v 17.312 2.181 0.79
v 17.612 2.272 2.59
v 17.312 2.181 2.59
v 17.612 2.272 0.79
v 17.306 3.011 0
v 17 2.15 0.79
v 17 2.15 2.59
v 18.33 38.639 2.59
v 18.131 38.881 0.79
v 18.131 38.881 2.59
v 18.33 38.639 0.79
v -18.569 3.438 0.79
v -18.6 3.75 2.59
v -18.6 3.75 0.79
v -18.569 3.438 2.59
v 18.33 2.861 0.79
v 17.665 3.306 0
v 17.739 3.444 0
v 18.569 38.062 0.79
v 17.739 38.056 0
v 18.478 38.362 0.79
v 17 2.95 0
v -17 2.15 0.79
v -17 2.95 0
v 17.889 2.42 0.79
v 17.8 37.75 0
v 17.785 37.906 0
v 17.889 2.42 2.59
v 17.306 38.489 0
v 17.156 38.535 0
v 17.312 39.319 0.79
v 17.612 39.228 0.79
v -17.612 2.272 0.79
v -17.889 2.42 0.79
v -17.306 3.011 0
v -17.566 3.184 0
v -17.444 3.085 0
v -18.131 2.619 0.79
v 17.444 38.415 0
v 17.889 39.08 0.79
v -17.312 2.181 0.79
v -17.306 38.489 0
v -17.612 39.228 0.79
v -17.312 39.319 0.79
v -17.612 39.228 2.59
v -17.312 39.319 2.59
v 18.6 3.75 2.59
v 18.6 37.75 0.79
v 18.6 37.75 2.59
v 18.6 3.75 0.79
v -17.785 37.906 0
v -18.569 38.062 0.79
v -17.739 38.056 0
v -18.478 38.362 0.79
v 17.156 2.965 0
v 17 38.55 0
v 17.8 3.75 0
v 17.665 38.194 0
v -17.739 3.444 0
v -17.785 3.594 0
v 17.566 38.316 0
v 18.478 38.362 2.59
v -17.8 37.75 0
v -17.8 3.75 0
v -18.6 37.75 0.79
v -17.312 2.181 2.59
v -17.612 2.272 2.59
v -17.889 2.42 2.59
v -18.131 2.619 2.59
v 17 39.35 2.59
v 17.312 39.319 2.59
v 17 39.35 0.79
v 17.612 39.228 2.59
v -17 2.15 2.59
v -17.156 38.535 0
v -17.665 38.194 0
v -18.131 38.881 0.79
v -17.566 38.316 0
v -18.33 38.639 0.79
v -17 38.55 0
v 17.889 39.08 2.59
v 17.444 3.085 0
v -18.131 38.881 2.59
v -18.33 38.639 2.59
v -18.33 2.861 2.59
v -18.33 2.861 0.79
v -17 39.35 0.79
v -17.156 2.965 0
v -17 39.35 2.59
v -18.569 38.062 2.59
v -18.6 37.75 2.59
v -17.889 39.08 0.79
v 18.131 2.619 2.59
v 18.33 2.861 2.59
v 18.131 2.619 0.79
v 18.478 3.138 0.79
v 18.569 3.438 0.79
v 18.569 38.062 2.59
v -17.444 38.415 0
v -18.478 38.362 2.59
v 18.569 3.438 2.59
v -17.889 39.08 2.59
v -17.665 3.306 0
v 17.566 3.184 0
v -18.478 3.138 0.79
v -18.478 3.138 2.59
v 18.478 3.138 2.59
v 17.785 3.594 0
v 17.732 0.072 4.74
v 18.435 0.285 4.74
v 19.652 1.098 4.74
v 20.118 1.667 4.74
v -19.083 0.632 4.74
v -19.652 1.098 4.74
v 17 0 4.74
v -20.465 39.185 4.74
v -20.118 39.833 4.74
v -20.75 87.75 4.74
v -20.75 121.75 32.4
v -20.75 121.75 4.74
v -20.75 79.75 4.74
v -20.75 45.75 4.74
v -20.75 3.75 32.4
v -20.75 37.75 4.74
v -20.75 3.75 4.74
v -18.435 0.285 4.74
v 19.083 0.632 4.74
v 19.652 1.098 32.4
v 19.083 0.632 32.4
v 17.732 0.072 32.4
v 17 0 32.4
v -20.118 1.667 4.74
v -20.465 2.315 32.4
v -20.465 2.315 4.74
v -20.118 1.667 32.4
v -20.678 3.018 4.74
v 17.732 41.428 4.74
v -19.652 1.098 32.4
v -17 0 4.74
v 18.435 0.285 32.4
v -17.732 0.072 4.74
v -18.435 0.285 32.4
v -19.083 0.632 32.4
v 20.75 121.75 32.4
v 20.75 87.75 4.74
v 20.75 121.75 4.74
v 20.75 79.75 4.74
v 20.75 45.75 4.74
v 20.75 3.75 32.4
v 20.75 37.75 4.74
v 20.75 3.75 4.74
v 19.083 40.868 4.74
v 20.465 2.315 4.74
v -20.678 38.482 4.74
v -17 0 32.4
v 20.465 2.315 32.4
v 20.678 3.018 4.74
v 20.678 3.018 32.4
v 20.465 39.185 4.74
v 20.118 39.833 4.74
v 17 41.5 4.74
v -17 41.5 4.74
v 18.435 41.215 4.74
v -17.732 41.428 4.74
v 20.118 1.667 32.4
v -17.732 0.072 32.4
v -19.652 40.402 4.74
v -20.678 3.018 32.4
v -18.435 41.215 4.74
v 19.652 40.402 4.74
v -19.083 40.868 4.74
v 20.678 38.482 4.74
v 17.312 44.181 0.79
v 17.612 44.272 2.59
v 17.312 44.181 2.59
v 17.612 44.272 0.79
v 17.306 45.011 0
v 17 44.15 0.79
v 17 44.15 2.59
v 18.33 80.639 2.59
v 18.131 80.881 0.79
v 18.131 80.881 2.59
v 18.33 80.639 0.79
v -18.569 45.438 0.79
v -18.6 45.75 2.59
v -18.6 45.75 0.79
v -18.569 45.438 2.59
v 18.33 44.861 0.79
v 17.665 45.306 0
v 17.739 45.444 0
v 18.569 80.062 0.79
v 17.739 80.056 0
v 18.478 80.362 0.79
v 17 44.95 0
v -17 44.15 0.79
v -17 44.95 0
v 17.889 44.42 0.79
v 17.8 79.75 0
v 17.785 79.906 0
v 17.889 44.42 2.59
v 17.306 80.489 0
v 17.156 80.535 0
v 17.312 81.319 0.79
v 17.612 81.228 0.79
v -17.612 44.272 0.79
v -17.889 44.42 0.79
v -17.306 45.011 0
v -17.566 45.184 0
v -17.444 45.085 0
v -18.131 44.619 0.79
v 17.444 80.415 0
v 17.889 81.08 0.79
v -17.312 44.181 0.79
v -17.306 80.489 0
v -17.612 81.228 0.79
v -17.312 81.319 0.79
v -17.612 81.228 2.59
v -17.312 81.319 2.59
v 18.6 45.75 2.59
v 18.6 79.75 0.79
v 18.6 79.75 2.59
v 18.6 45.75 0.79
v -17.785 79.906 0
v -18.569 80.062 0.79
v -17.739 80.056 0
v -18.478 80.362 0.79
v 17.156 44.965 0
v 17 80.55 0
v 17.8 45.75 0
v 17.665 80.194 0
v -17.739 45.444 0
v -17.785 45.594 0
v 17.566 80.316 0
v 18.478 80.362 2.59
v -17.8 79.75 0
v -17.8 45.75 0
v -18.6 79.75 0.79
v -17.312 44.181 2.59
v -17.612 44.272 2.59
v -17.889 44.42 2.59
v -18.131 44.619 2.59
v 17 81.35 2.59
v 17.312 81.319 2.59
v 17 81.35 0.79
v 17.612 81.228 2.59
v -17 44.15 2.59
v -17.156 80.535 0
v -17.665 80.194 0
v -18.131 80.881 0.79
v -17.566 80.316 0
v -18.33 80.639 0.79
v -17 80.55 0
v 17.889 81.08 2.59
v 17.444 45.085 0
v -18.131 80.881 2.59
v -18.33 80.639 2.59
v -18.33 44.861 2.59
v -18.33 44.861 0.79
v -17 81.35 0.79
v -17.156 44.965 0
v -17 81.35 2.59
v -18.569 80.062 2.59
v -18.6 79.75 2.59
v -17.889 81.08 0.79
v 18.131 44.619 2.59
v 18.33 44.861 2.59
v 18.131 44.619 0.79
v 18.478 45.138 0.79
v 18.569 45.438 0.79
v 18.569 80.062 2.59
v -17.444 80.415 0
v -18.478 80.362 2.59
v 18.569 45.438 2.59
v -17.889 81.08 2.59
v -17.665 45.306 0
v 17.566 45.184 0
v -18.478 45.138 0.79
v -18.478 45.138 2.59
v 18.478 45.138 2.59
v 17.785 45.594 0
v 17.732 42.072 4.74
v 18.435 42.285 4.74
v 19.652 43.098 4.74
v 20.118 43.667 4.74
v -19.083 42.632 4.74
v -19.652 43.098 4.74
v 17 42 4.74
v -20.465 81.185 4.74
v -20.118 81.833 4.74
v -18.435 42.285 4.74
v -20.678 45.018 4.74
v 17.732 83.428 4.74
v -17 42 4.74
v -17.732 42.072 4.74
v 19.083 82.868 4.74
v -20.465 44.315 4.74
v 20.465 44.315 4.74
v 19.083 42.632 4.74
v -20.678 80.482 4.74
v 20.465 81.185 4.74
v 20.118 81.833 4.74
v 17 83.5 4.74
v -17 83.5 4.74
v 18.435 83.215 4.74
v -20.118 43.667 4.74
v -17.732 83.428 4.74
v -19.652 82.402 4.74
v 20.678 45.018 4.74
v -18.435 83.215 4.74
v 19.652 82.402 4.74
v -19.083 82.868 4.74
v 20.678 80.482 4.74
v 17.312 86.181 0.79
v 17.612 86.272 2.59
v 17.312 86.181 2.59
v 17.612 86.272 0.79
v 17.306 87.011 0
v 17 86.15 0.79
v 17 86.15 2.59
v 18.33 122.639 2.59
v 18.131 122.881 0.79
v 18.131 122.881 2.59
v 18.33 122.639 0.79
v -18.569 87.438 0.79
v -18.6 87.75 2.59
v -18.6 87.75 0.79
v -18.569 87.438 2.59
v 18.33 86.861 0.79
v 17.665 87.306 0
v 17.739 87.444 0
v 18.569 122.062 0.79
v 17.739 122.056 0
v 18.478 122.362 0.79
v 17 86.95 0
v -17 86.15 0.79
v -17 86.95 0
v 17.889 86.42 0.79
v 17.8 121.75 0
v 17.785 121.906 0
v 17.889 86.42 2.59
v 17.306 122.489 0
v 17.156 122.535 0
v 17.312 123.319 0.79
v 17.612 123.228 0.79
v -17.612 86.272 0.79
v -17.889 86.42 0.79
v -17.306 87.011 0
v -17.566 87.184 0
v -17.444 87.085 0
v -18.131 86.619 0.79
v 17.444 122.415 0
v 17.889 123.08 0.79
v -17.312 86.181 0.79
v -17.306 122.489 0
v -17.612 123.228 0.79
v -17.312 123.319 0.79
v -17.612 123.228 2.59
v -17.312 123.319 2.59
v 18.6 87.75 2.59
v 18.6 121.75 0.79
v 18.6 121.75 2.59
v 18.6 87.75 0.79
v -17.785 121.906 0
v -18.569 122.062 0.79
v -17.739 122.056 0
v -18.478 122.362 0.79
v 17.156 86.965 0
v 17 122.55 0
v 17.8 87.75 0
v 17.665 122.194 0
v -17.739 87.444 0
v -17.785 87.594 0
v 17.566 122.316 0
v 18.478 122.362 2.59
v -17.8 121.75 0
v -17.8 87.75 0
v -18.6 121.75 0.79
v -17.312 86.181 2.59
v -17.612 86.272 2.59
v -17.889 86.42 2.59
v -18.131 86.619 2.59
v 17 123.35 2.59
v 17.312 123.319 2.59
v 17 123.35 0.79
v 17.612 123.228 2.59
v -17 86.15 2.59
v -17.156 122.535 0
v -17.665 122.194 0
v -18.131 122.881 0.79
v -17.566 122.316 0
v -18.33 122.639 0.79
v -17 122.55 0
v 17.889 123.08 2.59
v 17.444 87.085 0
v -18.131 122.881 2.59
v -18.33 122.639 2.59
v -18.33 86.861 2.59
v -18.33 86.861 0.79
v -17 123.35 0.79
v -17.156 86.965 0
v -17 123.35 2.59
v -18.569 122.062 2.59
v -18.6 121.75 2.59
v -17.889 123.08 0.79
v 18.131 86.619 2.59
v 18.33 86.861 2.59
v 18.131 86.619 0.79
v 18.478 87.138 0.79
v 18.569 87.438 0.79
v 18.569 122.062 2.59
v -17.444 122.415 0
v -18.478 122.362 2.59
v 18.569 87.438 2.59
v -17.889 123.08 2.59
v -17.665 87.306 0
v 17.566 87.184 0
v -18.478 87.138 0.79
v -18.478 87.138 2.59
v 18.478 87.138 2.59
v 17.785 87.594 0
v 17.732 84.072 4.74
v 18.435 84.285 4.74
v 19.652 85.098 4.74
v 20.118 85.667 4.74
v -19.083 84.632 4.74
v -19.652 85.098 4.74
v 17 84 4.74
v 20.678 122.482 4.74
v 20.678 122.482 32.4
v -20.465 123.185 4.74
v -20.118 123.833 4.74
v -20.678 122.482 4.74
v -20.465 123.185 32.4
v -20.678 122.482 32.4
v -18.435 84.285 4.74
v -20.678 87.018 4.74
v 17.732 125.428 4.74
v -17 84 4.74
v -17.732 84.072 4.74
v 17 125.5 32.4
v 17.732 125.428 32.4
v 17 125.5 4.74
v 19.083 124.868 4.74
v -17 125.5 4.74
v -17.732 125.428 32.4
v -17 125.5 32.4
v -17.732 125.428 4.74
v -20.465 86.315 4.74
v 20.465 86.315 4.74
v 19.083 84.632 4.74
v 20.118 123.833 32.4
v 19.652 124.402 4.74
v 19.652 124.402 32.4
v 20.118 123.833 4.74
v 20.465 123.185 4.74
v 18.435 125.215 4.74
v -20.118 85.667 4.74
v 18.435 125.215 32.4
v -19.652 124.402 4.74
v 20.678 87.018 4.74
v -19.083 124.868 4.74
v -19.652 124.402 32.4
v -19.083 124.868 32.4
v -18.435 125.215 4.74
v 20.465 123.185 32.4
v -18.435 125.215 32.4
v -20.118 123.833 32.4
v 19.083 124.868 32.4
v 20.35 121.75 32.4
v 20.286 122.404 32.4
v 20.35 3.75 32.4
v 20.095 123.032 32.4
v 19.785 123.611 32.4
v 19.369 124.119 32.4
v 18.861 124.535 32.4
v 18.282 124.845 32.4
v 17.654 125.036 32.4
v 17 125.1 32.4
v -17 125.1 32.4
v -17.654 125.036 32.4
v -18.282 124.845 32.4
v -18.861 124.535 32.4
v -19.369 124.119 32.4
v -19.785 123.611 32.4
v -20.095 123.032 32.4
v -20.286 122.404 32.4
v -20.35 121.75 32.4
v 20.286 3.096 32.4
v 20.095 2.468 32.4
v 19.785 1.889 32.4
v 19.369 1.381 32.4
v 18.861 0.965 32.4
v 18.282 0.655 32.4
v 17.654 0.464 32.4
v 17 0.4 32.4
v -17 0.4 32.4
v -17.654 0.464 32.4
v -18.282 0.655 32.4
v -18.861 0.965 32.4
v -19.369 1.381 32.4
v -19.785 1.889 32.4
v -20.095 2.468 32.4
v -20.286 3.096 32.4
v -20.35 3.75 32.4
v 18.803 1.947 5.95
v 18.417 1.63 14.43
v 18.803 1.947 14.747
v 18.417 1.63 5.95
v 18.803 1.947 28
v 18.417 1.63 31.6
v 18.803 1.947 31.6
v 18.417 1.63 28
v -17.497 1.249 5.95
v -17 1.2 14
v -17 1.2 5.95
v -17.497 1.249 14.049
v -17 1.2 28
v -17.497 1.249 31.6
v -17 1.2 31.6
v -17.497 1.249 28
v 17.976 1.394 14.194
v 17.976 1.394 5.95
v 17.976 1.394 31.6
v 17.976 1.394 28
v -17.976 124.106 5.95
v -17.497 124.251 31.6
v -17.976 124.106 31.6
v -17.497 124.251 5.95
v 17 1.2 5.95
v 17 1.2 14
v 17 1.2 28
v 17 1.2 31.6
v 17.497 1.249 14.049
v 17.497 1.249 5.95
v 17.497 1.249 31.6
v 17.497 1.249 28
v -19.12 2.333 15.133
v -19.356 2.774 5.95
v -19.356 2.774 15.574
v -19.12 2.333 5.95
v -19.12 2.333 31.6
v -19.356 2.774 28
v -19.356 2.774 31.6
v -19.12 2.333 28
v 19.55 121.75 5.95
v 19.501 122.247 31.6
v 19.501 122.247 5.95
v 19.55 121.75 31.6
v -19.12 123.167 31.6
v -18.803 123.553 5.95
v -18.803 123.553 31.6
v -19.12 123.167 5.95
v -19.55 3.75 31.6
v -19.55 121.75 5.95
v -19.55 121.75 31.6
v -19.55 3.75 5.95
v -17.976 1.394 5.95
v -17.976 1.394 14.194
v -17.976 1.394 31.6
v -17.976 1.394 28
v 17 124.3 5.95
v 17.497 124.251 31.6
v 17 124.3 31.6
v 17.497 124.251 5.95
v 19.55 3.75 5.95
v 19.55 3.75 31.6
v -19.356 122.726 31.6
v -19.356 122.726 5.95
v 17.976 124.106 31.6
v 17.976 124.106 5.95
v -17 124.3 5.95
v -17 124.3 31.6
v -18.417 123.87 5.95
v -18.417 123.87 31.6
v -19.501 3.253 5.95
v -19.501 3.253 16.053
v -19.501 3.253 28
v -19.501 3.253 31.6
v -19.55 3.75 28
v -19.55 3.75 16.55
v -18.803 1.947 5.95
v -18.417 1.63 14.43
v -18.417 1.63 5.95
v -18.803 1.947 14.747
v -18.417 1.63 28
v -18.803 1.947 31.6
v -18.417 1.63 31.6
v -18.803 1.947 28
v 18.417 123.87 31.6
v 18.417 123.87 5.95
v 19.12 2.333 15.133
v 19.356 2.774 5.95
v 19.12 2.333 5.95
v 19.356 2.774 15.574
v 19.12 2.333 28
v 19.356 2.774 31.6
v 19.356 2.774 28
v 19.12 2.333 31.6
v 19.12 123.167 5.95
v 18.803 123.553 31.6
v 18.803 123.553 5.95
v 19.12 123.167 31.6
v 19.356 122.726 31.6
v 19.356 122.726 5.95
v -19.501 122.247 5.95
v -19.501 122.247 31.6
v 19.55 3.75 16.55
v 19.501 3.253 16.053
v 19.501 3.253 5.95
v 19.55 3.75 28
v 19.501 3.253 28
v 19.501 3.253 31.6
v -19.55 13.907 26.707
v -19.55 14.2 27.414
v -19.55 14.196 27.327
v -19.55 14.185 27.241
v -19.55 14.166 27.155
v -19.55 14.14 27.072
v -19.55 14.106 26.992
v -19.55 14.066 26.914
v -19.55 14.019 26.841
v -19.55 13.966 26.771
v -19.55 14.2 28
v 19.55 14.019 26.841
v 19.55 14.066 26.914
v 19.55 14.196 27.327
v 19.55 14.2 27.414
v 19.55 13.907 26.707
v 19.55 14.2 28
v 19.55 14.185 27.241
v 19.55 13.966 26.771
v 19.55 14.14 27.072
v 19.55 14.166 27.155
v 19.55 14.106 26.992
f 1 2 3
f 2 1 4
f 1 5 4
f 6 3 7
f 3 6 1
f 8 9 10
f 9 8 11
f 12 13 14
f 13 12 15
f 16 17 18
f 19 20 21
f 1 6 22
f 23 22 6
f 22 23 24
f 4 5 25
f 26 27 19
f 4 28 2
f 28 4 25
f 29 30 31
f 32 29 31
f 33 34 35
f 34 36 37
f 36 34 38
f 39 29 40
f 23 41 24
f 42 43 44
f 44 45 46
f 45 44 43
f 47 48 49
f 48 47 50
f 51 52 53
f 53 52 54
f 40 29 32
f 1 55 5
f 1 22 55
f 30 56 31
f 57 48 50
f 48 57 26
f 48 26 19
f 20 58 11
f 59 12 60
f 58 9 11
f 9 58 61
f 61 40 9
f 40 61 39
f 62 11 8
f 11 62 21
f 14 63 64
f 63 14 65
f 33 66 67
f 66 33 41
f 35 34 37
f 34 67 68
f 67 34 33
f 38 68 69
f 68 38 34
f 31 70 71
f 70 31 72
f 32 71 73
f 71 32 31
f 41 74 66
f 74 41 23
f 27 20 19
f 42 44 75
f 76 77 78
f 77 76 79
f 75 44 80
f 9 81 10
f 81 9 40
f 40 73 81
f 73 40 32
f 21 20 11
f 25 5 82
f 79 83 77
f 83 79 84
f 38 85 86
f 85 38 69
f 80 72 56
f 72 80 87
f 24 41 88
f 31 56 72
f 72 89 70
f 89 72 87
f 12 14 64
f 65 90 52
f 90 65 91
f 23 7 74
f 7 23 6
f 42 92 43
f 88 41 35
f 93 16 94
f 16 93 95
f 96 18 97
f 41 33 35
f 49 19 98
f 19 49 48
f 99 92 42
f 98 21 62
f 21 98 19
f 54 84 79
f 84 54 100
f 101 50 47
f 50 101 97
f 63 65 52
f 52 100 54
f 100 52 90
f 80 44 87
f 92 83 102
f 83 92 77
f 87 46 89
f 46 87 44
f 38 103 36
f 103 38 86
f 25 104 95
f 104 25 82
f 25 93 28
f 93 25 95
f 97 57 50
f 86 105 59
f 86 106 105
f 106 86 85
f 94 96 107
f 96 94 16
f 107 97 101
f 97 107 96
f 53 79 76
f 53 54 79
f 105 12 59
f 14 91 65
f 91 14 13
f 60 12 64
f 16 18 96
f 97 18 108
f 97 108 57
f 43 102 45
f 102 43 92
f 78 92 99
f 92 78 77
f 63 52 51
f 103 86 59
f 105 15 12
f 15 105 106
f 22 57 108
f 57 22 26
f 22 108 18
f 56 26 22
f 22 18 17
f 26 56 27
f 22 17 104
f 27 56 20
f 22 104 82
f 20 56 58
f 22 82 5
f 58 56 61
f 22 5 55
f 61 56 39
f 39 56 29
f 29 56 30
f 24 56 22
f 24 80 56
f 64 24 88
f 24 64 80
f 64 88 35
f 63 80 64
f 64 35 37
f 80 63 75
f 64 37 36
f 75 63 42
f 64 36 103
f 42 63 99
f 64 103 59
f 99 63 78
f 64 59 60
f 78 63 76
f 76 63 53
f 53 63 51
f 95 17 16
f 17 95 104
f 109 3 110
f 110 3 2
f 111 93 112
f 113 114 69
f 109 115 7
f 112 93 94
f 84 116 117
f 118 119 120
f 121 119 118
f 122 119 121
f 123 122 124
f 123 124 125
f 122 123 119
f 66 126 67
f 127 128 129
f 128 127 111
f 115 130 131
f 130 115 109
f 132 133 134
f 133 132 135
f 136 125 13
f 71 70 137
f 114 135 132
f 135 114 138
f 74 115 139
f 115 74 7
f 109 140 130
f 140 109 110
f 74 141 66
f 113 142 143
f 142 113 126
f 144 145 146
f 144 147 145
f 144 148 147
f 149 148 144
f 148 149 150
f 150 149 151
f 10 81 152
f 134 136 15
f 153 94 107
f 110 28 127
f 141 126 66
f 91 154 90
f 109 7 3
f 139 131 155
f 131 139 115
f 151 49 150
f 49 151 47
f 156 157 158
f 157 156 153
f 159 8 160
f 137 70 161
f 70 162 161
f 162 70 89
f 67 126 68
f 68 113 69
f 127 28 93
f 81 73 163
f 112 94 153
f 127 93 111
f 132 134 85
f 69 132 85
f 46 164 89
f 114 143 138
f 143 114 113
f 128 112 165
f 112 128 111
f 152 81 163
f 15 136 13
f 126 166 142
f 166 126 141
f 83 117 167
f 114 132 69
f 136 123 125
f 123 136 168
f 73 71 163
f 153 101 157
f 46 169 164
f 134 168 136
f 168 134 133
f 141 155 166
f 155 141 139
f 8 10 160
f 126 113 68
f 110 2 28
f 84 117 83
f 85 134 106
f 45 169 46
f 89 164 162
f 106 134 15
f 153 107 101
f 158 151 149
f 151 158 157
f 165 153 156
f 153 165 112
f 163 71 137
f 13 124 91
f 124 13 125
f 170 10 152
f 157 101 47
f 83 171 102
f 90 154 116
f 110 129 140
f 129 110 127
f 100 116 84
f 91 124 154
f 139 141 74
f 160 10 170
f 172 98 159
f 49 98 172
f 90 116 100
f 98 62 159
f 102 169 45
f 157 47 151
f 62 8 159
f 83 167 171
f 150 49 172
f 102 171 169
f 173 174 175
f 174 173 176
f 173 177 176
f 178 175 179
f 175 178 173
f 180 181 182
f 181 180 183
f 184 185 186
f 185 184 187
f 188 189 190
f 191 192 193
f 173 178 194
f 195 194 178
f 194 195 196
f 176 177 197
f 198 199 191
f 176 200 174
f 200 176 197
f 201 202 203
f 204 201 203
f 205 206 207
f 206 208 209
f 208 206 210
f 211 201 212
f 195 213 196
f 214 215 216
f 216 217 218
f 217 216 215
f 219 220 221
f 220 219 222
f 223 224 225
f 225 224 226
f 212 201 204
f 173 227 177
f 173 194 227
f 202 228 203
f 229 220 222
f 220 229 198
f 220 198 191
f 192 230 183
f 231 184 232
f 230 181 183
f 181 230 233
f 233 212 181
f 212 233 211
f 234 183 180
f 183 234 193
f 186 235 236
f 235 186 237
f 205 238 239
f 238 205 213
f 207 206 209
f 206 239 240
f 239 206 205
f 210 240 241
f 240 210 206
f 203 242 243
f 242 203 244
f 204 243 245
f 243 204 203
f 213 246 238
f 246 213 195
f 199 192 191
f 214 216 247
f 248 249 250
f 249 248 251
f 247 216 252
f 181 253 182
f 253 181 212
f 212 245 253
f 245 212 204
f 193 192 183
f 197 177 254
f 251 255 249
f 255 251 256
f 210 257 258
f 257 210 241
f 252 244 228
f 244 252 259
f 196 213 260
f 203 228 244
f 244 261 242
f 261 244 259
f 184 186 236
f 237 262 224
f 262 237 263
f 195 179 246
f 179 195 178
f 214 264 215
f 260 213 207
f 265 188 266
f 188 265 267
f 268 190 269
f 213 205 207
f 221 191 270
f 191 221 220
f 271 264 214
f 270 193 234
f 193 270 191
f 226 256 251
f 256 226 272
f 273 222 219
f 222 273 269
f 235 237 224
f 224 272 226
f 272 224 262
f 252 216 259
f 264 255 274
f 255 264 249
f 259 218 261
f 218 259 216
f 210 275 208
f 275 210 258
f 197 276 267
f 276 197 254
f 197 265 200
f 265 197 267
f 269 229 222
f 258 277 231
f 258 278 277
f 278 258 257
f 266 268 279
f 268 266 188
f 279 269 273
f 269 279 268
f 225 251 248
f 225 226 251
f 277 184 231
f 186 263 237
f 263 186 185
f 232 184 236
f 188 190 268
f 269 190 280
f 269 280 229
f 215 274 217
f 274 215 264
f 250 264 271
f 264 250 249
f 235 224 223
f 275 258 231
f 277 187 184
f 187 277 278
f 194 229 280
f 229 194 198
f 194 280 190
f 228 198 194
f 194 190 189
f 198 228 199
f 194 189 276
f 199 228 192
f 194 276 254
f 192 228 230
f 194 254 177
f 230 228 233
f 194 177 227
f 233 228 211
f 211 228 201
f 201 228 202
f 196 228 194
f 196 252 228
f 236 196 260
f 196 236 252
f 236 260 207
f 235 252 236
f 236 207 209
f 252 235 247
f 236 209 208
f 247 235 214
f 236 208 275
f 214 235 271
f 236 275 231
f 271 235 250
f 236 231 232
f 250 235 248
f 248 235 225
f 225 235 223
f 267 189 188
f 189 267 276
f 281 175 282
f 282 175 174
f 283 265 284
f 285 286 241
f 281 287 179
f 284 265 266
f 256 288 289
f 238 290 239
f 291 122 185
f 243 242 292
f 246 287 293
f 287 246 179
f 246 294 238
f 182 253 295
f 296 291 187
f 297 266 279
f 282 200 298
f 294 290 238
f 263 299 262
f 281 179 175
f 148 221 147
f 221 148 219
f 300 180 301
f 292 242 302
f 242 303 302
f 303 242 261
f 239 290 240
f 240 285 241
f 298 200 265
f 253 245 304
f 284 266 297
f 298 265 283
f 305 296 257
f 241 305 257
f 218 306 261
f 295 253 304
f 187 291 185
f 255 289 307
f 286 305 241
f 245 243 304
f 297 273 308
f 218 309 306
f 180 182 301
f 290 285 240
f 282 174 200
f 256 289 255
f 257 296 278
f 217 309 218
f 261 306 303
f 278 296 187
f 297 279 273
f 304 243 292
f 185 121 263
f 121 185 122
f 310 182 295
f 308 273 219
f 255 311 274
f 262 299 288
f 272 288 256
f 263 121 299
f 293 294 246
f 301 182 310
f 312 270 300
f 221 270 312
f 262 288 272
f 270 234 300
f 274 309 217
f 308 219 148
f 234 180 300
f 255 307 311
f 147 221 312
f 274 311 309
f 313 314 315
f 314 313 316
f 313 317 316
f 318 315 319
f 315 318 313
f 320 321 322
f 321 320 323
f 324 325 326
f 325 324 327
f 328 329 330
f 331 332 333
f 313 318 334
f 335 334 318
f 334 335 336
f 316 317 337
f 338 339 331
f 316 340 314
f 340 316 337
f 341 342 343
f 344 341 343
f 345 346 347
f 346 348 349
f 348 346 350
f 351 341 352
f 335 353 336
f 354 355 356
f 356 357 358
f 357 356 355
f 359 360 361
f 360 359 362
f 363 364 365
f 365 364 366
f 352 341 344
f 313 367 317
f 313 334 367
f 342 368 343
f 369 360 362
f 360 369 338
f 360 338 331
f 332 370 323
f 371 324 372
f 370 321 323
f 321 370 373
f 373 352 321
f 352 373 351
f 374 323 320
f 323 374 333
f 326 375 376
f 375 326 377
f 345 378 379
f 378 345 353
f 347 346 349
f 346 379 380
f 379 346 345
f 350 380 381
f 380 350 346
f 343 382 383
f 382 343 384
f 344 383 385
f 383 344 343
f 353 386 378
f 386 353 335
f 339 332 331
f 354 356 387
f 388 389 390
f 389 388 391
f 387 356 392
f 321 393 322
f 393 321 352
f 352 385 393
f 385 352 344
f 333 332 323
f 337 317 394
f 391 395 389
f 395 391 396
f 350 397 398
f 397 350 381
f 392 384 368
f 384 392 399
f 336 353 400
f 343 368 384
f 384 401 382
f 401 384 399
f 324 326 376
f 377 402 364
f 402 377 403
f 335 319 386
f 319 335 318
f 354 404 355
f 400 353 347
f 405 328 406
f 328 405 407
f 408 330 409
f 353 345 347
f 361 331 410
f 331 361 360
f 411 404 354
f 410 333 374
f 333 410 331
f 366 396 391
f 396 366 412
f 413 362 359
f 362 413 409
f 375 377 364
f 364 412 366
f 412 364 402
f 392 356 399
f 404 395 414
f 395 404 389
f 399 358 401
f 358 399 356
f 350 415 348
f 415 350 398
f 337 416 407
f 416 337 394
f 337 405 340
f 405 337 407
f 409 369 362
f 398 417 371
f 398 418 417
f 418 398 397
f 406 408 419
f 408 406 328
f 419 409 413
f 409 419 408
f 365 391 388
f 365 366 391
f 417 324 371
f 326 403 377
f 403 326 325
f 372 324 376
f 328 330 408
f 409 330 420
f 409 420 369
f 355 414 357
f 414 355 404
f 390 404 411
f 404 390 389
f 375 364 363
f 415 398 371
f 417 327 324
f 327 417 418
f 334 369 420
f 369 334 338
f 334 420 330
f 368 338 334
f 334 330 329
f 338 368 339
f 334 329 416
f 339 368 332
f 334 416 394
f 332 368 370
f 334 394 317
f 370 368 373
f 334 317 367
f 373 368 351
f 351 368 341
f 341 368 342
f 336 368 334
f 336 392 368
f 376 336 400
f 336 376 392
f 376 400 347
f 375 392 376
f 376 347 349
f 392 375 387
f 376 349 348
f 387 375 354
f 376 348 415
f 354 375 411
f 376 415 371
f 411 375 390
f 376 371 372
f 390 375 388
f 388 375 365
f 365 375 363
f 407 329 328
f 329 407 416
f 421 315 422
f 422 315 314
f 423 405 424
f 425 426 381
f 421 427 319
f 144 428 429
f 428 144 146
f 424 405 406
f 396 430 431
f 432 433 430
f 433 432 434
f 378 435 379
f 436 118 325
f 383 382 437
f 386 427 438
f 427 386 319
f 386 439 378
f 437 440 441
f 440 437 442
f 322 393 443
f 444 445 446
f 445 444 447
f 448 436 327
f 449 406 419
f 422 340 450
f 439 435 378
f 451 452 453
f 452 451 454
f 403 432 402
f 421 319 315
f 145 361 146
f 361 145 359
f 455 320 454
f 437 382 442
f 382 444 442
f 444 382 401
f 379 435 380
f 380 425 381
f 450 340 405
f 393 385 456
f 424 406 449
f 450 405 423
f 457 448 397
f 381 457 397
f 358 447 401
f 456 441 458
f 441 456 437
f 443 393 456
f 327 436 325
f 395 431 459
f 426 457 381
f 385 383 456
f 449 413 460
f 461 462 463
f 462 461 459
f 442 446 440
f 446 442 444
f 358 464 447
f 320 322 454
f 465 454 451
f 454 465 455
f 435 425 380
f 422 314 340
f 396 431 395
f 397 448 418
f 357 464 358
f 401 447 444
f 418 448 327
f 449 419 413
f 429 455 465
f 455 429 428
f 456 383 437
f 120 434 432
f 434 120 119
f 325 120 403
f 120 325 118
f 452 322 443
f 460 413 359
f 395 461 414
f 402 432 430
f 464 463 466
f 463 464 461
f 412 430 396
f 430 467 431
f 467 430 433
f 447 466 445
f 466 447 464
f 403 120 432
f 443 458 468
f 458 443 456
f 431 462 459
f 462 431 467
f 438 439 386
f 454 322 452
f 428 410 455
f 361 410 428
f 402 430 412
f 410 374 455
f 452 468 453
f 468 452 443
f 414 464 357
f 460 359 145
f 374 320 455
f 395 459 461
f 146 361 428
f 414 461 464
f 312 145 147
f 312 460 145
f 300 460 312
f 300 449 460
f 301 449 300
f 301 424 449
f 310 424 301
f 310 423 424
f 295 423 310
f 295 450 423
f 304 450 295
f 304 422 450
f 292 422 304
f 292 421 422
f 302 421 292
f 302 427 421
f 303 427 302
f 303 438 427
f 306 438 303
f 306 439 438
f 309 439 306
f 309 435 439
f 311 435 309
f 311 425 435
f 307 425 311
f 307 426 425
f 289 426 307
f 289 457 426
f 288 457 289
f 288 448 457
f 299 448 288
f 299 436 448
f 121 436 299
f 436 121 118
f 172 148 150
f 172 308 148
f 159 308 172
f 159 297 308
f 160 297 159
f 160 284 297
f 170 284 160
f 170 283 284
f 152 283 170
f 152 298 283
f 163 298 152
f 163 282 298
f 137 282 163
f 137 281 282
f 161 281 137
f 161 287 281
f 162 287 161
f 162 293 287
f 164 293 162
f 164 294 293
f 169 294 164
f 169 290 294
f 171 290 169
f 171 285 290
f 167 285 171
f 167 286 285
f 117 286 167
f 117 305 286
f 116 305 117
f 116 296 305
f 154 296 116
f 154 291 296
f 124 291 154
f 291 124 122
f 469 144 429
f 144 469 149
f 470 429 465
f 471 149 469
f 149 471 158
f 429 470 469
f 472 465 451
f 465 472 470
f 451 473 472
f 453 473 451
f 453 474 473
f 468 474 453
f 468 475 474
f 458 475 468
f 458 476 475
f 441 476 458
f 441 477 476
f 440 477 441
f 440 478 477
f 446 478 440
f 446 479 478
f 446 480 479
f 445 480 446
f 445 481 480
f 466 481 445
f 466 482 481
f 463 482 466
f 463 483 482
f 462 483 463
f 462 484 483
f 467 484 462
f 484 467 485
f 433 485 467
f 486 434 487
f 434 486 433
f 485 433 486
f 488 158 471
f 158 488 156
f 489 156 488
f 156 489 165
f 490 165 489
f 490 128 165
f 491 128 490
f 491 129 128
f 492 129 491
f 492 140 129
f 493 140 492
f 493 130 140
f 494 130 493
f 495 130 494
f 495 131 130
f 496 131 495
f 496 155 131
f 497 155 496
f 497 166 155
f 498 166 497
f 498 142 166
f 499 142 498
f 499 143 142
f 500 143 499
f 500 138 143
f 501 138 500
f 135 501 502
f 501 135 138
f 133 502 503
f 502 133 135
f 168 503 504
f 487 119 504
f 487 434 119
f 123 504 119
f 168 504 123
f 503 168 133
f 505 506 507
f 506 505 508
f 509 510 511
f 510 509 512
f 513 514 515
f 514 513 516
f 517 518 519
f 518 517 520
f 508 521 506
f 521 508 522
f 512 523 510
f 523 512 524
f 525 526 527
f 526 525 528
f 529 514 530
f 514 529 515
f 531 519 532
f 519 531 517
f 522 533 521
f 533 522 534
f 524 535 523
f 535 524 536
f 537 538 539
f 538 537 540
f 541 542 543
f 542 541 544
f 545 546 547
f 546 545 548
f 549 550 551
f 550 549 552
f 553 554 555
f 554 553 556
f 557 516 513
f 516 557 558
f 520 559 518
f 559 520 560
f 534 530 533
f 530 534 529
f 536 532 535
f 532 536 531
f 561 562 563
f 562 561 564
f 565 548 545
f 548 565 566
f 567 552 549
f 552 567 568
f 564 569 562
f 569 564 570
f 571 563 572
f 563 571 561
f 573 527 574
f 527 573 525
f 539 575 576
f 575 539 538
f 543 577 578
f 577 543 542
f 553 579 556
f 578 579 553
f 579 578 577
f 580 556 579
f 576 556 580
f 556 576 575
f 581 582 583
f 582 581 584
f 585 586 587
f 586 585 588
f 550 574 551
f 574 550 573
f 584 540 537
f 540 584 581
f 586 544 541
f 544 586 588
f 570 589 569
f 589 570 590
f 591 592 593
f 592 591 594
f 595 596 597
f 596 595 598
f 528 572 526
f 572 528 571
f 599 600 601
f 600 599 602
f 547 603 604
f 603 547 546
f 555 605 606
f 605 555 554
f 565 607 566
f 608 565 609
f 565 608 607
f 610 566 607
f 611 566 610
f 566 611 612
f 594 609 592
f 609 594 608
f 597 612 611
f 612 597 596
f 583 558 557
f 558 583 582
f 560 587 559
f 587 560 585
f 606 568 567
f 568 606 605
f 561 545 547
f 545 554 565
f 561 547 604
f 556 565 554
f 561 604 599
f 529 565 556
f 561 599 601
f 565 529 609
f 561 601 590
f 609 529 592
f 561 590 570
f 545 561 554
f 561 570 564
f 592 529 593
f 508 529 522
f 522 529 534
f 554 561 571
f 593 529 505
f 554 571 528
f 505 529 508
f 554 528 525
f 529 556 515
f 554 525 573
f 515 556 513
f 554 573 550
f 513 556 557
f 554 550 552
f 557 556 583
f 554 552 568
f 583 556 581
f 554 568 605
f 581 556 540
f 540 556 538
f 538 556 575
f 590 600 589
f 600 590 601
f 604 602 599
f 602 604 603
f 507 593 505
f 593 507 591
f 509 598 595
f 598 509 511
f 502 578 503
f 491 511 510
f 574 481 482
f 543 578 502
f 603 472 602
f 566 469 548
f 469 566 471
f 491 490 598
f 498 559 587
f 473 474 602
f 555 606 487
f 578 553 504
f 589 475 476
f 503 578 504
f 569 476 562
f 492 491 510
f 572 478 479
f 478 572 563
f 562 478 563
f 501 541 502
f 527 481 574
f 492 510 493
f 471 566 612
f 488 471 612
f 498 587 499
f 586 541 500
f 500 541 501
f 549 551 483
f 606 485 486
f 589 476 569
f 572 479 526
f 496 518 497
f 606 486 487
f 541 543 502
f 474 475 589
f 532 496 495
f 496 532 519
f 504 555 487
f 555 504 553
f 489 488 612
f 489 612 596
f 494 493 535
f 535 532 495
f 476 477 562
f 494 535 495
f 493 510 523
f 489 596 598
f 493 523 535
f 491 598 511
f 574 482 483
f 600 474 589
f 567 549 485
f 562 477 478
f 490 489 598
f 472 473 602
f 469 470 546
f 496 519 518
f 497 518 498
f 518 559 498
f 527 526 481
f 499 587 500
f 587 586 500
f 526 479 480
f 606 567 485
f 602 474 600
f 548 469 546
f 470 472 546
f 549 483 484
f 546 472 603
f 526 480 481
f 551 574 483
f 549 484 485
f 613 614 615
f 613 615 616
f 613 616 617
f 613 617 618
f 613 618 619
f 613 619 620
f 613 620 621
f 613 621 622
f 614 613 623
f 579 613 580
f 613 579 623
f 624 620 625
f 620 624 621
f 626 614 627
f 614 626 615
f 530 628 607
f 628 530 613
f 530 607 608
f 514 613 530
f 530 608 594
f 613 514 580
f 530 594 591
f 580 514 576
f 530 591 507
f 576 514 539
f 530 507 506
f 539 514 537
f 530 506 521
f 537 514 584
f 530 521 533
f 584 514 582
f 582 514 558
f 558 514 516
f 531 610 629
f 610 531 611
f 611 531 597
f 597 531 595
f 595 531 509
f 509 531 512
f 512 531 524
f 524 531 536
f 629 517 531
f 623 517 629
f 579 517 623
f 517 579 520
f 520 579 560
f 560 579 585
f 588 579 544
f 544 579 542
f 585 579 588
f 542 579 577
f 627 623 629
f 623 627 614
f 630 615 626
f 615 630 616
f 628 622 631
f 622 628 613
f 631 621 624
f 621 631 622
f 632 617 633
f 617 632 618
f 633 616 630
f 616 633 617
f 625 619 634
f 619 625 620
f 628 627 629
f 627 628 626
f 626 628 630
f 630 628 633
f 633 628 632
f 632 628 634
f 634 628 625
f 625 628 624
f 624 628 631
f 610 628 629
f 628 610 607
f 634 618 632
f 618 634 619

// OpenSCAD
// file: ../../../modules/gridfinity.scad
// Gridfinity ベースプレートの共有 module。
// 寸法は Gridfinity 仕様 (Zack Freedman) の baseplate 輪郭に従う:
//   ピッチ 42、ソケット上端開口 41.5 (角 R4)、上から 45° 面取り 2.15 →
//   垂直 1.8 (37.2 角・R1.85) → 45° 面取り 0.7 → 底 35.8 角 (R1.15)。
//   ソケット深さ = 2.15 + 1.8 + 0.7 = 4.65。
//
// 座標系: X が列方向 (中央が 0)、Y が行方向 (板の前端が 0)、Z=0 が板の底面。
// 板の外形は grid とは独立に rim で与えるので、grid より大きい板 (縁付き) を
// 作れる。ソケットは rim=[left, right, front, back] の内側へ 42 ピッチで並ぶ。

gf_pitch = 42;
gf_socket_top = 41.5; // 上端開口
gf_socket_mid = 37.2; // 垂直部
gf_socket_bot = 35.8; // 底
gf_socket_r_top = 4;
gf_socket_r_mid = 1.85;
gf_socket_r_bot = 1.15;
gf_chamfer_top = 2.15;
gf_wall_h = 1.8;
gf_chamfer_bot = 0.7;
gf_socket_depth = gf_chamfer_top + gf_wall_h + gf_chamfer_bot; // 4.65
gf_fn = 32;
gf_eps = 0.01; // hull 用の薄板の厚さ
gf_over = 0.5; // 切削の抜き代

// 角丸正方形または矩形 (w は一辺、または [幅, 奥行き]、角 R)
module
gf_rounded_square(w, r)
{
    offset(r = r, $fn = gf_fn)
        square(is_list(w) ? w - [ 2 * r, 2 * r ] : w - 2 * r, center = true);
}

// 厚さ gf_eps の角丸正方形の薄板を z に置く (hull の骨)
module
gf_slab(w, r, z)
{
    translate([ 0, 0, z ]) linear_extrude(gf_eps) gf_rounded_square(w, r);
}

// ソケット1個の切削体。z=0 がソケットの底 (床の天面)、+Z へ 4.65 で天面に出る。
// clearance は嵌合の逃げで、輪郭を全周へ clearance だけ外へ出す (幅 +2c、角 R
// +c)。pitch_x は X 方向のセル幅。端数でも角 R と面取りの寸法を保つ。
module
gf_socket_cut(clearance = 0, pitch_x = gf_pitch)
{
    z1 = gf_chamfer_bot;
    z2 = z1 + gf_wall_h;
    z3 = gf_socket_depth;
    c = clearance;
    assert(pitch_x > gf_pitch - gf_socket_top + 2 * gf_socket_r_top,
           "Cell width is too small for the socket corner radius");
    delta = [ pitch_x - gf_pitch, 0 ];
    bot = [ gf_socket_bot + 2 * c, gf_socket_bot + 2 * c ] + delta;
    mid = [ gf_socket_mid + 2 * c, gf_socket_mid + 2 * c ] + delta;
    top = [ gf_socket_top + 2 * c, gf_socket_top + 2 * c ] + delta;
    hull()
    {
        gf_slab(bot, gf_socket_r_bot + c, 0);
        gf_slab(mid, gf_socket_r_mid + c, z1 - gf_eps);
    }
    hull()
    {
        gf_slab(mid, gf_socket_r_mid + c, z1 - gf_eps);
        gf_slab(mid, gf_socket_r_mid + c, z2 - gf_eps);
    }
    hull()
    {
        gf_slab(mid, gf_socket_r_mid + c, z2 - gf_eps);
        gf_slab(top, gf_socket_r_top + c, z3 - gf_eps);
    }
    // 天面より上へ抜く (天面と同一平面の退化した面を残さない)
    gf_slab(top, gf_socket_r_top + c, z3 - gf_eps);
    translate([ 0, 0, z3 - gf_eps ]) linear_extrude(gf_over + gf_eps)
        gf_rounded_square(top, gf_socket_r_top + c);
}

// ベースプレート。cols x rows のソケットを床 floor_t の上に彫る。
// rim = [left, right, front, back] はソケット列の外側に残す縁の幅。
// 板の幅 = cols*42 + left + right、奥行き = rows*42 + front + back。
// cols の端数は左端の細幅セルになる。rows は正の整数。
// clearance はソケットの嵌合の逃げ (gf_socket_cut を参照)。
module
gf_baseplate(cols, rows, rim = [ 0, 0, 0, 0 ], floor_t = 1, clearance = 0)
{
    grid_w = cols * gf_pitch;
    grid_d = rows * gf_pitch;
    plate_w = grid_w + rim[0] + rim[1];
    plate_d = grid_d + rim[2] + rim[3];
    x0 = -plate_w / 2 + rim[0]; // ソケット列の左端
    first_pitch = grid_w - (ceil(cols) - 1) * gf_pitch;
    difference()
    {
        translate([ -plate_w / 2, 0, 0 ])
            cube([ plate_w, plate_d, floor_t + gf_socket_depth ]);
        for (c = [0:ceil(cols) - 1], r = [0:rows - 1])
            translate([
                x0 + (c == 0 ? first_pitch / 2
                             : first_pitch + (c - 0.5) * gf_pitch),
                rim[2] + (r + 0.5) * gf_pitch,
                floor_t
            ]) gf_socket_cut(clearance, c == 0 ? first_pitch : gf_pitch);
    }
}
// file: ../../../modules/gridfinity_bins.scad
include <gridfinity_bin.scad>

// assets/gridfinity-bin/ の bin 群の共通値と、サイズ 3 引数の払い出し口。
// 単体では何も描かない。設計の経緯と確定値は
// ledger/designs/gridfinity-bin-4u.md が正本。
// 通常binは4U/9U、X={1,1.5,2,2.5,3} × Y={1,2,3,4,5,5.5}。
// 両軸に端数を持つ組み合わせはassetに置かない（各高さ28種）。
// Xが横、Yがラベルの壁から奥、unitsが高さ（7mm単位）。
wall = 1.2;    // 0.4 ノズル 3 本
floor_t = 1.2; // 底 (4.75) の上に載せる床。床の天面 z = 5.95
label_d = 13;  // 12mm 幅のラベルシールを貼る天板の張り出し
label_t = 1; // 天板の厚さ (user 指定)。下は 45° の無垢のくさび
label_r = 1; // 天板の先端と 45° 面の境目の R (user 指定)
// カードケース (goods/card_case_2x3x4u.scad) の値。カードは ISO/IEC 7810 ID-1 (85.6 × 54 ×
// 0.76、隅 R3) で、長辺を Y (rows 方向) に寝かせ、X 中央・手前の壁から 10 奥に置く。ポケットは
// カードより 1 大きい (片側 0.5)。右奥のマスは壁の内面まで抜き、床と底を外形に平行な 45° の窪みにする。
// ポケットの左右の埋めの天面 (幅 13.05) が 12mm のラベルを貼る帯。ポケットと穴の交点の
// 縦エッジは丸める (開口の上縁は丸めない: 壁を上端まで垂直に保ち、収まる枚数を減らさない)
card_w = 54;    // カードの短辺 (X)。user 指定「高さ 54」
card_d = 85.6;  // カードの長辺 (Y)。user 指定「幅 85.6」
card_clear = 1; // ポケットの余裕 (user 指定「+1mm」)
// ポケットの手前の辺の、手前の壁の内面からの距離 (user 指定「10mm」)
card_off = 10;
// ポケットの平面の隅 R (user 指定「角の丸み 3mm」。ID-1 の隅は 2.88..3.48)
card_r = 3;
// ポケットと穴が交わる所の、埋めの凸の縦エッジの R (指の当たる角)
card_edge_r = 2;
recess_skin = floor_t + 1.75; // 窪みの床 z (底の皮)。user 指定「壁厚と同じ 1.2 は過剰、1.75 返す」

function bin_contract(cols, rows, units) = str("CONTRACT units=",
                                               units,
                                               " pitch=",
                                               gf_pitch,
                                               " outer=",
                                               gfb_outer,
                                               " h=",
                                               units* gfb_unit,
                                               " lip=",
                                               gfb_lip_h,
                                               " base=",
                                               gfb_base_bot,
                                               "/",
                                               gfb_base_mid,
                                               "/",
                                               gfb_outer,
                                               " base_h=",
                                               gfb_base_h,
                                               " wall=",
                                               wall,
                                               " floor_top=",
                                               gfb_base_h + floor_t,
                                               " label=",
                                               label_d,
                                               "x",
                                               label_t,
                                               " wedge=45 fillet=",
                                               label_r,
                                               " bin=",
                                               cols,
                                               "x",
                                               rows,
                                               " size=",
                                               cols* gf_pitch - 0.5,
                                               "x",
                                               rows* gf_pitch - 0.5);

// (cols, rows, units) でラベル付き bin を払い出す。例: gridfinity_bin(2, 4, 4)
module
gridfinity_bin(cols, rows, units = 4)
{
    echo(bin_contract(cols, rows, units));
    gfb_bin(cols, rows, units, wall, floor_t, label_d, label_t, label_r);
}

function card_contract(cols, rows, units) = str("CONTRACT card units=",
                                                units,
                                                " bin=",
                                                cols,
                                                "x",
                                                rows,
                                                " size=",
                                                cols* gf_pitch - 0.5,
                                                "x",
                                                rows* gf_pitch - 0.5,
                                                " h=",
                                                units* gfb_unit,
                                                " lip=",
                                                gfb_lip_h,
                                                " floor_top=",
                                                gfb_base_h + floor_t,
                                                " card=",
                                                card_w,
                                                "x",
                                                card_d,
                                                " pocket=",
                                                card_w + card_clear,
                                                "x",
                                                card_d + card_clear,
                                                " at=",
                                                -(card_w + card_clear) / 2,
                                                ",",
                                                wall + card_off,
                                                " hole=",
                                                (cols - 1) / 2 * gf_pitch - gfb_outer / 2,
                                                ",",
                                                (rows - 0.5) * gf_pitch - 0.25 - gfb_outer / 2,
                                                " hole_r=",
                                                gfb_outer_r - wall,
                                                " recess=",
                                                gfb_outer - 2 * wall,
                                                "/",
                                                gfb_base_mid - 2 * wall,
                                                " recess_floor=",
                                                recess_skin,
                                                " r=",
                                                card_r,
                                                " edge_r=",
                                                card_edge_r);

// (cols, rows, units) でカードケースを払い出す。例: gridfinity_card_case(2, 3, 4)
module
gridfinity_card_case(cols, rows, units = 4)
{
    echo(card_contract(cols, rows, units));
    gfb_card_case(cols,
                  rows,
                  units,
                  wall,
                  floor_t,
                  [ card_w, card_d ],
                  card_clear,
                  card_off,
                  card_r,
                  recess_skin,
                  card_edge_r);
}
// main file
include <../../../modules/gridfinity_bins.scad>

gridfinity_bin(1, 3, 4);
